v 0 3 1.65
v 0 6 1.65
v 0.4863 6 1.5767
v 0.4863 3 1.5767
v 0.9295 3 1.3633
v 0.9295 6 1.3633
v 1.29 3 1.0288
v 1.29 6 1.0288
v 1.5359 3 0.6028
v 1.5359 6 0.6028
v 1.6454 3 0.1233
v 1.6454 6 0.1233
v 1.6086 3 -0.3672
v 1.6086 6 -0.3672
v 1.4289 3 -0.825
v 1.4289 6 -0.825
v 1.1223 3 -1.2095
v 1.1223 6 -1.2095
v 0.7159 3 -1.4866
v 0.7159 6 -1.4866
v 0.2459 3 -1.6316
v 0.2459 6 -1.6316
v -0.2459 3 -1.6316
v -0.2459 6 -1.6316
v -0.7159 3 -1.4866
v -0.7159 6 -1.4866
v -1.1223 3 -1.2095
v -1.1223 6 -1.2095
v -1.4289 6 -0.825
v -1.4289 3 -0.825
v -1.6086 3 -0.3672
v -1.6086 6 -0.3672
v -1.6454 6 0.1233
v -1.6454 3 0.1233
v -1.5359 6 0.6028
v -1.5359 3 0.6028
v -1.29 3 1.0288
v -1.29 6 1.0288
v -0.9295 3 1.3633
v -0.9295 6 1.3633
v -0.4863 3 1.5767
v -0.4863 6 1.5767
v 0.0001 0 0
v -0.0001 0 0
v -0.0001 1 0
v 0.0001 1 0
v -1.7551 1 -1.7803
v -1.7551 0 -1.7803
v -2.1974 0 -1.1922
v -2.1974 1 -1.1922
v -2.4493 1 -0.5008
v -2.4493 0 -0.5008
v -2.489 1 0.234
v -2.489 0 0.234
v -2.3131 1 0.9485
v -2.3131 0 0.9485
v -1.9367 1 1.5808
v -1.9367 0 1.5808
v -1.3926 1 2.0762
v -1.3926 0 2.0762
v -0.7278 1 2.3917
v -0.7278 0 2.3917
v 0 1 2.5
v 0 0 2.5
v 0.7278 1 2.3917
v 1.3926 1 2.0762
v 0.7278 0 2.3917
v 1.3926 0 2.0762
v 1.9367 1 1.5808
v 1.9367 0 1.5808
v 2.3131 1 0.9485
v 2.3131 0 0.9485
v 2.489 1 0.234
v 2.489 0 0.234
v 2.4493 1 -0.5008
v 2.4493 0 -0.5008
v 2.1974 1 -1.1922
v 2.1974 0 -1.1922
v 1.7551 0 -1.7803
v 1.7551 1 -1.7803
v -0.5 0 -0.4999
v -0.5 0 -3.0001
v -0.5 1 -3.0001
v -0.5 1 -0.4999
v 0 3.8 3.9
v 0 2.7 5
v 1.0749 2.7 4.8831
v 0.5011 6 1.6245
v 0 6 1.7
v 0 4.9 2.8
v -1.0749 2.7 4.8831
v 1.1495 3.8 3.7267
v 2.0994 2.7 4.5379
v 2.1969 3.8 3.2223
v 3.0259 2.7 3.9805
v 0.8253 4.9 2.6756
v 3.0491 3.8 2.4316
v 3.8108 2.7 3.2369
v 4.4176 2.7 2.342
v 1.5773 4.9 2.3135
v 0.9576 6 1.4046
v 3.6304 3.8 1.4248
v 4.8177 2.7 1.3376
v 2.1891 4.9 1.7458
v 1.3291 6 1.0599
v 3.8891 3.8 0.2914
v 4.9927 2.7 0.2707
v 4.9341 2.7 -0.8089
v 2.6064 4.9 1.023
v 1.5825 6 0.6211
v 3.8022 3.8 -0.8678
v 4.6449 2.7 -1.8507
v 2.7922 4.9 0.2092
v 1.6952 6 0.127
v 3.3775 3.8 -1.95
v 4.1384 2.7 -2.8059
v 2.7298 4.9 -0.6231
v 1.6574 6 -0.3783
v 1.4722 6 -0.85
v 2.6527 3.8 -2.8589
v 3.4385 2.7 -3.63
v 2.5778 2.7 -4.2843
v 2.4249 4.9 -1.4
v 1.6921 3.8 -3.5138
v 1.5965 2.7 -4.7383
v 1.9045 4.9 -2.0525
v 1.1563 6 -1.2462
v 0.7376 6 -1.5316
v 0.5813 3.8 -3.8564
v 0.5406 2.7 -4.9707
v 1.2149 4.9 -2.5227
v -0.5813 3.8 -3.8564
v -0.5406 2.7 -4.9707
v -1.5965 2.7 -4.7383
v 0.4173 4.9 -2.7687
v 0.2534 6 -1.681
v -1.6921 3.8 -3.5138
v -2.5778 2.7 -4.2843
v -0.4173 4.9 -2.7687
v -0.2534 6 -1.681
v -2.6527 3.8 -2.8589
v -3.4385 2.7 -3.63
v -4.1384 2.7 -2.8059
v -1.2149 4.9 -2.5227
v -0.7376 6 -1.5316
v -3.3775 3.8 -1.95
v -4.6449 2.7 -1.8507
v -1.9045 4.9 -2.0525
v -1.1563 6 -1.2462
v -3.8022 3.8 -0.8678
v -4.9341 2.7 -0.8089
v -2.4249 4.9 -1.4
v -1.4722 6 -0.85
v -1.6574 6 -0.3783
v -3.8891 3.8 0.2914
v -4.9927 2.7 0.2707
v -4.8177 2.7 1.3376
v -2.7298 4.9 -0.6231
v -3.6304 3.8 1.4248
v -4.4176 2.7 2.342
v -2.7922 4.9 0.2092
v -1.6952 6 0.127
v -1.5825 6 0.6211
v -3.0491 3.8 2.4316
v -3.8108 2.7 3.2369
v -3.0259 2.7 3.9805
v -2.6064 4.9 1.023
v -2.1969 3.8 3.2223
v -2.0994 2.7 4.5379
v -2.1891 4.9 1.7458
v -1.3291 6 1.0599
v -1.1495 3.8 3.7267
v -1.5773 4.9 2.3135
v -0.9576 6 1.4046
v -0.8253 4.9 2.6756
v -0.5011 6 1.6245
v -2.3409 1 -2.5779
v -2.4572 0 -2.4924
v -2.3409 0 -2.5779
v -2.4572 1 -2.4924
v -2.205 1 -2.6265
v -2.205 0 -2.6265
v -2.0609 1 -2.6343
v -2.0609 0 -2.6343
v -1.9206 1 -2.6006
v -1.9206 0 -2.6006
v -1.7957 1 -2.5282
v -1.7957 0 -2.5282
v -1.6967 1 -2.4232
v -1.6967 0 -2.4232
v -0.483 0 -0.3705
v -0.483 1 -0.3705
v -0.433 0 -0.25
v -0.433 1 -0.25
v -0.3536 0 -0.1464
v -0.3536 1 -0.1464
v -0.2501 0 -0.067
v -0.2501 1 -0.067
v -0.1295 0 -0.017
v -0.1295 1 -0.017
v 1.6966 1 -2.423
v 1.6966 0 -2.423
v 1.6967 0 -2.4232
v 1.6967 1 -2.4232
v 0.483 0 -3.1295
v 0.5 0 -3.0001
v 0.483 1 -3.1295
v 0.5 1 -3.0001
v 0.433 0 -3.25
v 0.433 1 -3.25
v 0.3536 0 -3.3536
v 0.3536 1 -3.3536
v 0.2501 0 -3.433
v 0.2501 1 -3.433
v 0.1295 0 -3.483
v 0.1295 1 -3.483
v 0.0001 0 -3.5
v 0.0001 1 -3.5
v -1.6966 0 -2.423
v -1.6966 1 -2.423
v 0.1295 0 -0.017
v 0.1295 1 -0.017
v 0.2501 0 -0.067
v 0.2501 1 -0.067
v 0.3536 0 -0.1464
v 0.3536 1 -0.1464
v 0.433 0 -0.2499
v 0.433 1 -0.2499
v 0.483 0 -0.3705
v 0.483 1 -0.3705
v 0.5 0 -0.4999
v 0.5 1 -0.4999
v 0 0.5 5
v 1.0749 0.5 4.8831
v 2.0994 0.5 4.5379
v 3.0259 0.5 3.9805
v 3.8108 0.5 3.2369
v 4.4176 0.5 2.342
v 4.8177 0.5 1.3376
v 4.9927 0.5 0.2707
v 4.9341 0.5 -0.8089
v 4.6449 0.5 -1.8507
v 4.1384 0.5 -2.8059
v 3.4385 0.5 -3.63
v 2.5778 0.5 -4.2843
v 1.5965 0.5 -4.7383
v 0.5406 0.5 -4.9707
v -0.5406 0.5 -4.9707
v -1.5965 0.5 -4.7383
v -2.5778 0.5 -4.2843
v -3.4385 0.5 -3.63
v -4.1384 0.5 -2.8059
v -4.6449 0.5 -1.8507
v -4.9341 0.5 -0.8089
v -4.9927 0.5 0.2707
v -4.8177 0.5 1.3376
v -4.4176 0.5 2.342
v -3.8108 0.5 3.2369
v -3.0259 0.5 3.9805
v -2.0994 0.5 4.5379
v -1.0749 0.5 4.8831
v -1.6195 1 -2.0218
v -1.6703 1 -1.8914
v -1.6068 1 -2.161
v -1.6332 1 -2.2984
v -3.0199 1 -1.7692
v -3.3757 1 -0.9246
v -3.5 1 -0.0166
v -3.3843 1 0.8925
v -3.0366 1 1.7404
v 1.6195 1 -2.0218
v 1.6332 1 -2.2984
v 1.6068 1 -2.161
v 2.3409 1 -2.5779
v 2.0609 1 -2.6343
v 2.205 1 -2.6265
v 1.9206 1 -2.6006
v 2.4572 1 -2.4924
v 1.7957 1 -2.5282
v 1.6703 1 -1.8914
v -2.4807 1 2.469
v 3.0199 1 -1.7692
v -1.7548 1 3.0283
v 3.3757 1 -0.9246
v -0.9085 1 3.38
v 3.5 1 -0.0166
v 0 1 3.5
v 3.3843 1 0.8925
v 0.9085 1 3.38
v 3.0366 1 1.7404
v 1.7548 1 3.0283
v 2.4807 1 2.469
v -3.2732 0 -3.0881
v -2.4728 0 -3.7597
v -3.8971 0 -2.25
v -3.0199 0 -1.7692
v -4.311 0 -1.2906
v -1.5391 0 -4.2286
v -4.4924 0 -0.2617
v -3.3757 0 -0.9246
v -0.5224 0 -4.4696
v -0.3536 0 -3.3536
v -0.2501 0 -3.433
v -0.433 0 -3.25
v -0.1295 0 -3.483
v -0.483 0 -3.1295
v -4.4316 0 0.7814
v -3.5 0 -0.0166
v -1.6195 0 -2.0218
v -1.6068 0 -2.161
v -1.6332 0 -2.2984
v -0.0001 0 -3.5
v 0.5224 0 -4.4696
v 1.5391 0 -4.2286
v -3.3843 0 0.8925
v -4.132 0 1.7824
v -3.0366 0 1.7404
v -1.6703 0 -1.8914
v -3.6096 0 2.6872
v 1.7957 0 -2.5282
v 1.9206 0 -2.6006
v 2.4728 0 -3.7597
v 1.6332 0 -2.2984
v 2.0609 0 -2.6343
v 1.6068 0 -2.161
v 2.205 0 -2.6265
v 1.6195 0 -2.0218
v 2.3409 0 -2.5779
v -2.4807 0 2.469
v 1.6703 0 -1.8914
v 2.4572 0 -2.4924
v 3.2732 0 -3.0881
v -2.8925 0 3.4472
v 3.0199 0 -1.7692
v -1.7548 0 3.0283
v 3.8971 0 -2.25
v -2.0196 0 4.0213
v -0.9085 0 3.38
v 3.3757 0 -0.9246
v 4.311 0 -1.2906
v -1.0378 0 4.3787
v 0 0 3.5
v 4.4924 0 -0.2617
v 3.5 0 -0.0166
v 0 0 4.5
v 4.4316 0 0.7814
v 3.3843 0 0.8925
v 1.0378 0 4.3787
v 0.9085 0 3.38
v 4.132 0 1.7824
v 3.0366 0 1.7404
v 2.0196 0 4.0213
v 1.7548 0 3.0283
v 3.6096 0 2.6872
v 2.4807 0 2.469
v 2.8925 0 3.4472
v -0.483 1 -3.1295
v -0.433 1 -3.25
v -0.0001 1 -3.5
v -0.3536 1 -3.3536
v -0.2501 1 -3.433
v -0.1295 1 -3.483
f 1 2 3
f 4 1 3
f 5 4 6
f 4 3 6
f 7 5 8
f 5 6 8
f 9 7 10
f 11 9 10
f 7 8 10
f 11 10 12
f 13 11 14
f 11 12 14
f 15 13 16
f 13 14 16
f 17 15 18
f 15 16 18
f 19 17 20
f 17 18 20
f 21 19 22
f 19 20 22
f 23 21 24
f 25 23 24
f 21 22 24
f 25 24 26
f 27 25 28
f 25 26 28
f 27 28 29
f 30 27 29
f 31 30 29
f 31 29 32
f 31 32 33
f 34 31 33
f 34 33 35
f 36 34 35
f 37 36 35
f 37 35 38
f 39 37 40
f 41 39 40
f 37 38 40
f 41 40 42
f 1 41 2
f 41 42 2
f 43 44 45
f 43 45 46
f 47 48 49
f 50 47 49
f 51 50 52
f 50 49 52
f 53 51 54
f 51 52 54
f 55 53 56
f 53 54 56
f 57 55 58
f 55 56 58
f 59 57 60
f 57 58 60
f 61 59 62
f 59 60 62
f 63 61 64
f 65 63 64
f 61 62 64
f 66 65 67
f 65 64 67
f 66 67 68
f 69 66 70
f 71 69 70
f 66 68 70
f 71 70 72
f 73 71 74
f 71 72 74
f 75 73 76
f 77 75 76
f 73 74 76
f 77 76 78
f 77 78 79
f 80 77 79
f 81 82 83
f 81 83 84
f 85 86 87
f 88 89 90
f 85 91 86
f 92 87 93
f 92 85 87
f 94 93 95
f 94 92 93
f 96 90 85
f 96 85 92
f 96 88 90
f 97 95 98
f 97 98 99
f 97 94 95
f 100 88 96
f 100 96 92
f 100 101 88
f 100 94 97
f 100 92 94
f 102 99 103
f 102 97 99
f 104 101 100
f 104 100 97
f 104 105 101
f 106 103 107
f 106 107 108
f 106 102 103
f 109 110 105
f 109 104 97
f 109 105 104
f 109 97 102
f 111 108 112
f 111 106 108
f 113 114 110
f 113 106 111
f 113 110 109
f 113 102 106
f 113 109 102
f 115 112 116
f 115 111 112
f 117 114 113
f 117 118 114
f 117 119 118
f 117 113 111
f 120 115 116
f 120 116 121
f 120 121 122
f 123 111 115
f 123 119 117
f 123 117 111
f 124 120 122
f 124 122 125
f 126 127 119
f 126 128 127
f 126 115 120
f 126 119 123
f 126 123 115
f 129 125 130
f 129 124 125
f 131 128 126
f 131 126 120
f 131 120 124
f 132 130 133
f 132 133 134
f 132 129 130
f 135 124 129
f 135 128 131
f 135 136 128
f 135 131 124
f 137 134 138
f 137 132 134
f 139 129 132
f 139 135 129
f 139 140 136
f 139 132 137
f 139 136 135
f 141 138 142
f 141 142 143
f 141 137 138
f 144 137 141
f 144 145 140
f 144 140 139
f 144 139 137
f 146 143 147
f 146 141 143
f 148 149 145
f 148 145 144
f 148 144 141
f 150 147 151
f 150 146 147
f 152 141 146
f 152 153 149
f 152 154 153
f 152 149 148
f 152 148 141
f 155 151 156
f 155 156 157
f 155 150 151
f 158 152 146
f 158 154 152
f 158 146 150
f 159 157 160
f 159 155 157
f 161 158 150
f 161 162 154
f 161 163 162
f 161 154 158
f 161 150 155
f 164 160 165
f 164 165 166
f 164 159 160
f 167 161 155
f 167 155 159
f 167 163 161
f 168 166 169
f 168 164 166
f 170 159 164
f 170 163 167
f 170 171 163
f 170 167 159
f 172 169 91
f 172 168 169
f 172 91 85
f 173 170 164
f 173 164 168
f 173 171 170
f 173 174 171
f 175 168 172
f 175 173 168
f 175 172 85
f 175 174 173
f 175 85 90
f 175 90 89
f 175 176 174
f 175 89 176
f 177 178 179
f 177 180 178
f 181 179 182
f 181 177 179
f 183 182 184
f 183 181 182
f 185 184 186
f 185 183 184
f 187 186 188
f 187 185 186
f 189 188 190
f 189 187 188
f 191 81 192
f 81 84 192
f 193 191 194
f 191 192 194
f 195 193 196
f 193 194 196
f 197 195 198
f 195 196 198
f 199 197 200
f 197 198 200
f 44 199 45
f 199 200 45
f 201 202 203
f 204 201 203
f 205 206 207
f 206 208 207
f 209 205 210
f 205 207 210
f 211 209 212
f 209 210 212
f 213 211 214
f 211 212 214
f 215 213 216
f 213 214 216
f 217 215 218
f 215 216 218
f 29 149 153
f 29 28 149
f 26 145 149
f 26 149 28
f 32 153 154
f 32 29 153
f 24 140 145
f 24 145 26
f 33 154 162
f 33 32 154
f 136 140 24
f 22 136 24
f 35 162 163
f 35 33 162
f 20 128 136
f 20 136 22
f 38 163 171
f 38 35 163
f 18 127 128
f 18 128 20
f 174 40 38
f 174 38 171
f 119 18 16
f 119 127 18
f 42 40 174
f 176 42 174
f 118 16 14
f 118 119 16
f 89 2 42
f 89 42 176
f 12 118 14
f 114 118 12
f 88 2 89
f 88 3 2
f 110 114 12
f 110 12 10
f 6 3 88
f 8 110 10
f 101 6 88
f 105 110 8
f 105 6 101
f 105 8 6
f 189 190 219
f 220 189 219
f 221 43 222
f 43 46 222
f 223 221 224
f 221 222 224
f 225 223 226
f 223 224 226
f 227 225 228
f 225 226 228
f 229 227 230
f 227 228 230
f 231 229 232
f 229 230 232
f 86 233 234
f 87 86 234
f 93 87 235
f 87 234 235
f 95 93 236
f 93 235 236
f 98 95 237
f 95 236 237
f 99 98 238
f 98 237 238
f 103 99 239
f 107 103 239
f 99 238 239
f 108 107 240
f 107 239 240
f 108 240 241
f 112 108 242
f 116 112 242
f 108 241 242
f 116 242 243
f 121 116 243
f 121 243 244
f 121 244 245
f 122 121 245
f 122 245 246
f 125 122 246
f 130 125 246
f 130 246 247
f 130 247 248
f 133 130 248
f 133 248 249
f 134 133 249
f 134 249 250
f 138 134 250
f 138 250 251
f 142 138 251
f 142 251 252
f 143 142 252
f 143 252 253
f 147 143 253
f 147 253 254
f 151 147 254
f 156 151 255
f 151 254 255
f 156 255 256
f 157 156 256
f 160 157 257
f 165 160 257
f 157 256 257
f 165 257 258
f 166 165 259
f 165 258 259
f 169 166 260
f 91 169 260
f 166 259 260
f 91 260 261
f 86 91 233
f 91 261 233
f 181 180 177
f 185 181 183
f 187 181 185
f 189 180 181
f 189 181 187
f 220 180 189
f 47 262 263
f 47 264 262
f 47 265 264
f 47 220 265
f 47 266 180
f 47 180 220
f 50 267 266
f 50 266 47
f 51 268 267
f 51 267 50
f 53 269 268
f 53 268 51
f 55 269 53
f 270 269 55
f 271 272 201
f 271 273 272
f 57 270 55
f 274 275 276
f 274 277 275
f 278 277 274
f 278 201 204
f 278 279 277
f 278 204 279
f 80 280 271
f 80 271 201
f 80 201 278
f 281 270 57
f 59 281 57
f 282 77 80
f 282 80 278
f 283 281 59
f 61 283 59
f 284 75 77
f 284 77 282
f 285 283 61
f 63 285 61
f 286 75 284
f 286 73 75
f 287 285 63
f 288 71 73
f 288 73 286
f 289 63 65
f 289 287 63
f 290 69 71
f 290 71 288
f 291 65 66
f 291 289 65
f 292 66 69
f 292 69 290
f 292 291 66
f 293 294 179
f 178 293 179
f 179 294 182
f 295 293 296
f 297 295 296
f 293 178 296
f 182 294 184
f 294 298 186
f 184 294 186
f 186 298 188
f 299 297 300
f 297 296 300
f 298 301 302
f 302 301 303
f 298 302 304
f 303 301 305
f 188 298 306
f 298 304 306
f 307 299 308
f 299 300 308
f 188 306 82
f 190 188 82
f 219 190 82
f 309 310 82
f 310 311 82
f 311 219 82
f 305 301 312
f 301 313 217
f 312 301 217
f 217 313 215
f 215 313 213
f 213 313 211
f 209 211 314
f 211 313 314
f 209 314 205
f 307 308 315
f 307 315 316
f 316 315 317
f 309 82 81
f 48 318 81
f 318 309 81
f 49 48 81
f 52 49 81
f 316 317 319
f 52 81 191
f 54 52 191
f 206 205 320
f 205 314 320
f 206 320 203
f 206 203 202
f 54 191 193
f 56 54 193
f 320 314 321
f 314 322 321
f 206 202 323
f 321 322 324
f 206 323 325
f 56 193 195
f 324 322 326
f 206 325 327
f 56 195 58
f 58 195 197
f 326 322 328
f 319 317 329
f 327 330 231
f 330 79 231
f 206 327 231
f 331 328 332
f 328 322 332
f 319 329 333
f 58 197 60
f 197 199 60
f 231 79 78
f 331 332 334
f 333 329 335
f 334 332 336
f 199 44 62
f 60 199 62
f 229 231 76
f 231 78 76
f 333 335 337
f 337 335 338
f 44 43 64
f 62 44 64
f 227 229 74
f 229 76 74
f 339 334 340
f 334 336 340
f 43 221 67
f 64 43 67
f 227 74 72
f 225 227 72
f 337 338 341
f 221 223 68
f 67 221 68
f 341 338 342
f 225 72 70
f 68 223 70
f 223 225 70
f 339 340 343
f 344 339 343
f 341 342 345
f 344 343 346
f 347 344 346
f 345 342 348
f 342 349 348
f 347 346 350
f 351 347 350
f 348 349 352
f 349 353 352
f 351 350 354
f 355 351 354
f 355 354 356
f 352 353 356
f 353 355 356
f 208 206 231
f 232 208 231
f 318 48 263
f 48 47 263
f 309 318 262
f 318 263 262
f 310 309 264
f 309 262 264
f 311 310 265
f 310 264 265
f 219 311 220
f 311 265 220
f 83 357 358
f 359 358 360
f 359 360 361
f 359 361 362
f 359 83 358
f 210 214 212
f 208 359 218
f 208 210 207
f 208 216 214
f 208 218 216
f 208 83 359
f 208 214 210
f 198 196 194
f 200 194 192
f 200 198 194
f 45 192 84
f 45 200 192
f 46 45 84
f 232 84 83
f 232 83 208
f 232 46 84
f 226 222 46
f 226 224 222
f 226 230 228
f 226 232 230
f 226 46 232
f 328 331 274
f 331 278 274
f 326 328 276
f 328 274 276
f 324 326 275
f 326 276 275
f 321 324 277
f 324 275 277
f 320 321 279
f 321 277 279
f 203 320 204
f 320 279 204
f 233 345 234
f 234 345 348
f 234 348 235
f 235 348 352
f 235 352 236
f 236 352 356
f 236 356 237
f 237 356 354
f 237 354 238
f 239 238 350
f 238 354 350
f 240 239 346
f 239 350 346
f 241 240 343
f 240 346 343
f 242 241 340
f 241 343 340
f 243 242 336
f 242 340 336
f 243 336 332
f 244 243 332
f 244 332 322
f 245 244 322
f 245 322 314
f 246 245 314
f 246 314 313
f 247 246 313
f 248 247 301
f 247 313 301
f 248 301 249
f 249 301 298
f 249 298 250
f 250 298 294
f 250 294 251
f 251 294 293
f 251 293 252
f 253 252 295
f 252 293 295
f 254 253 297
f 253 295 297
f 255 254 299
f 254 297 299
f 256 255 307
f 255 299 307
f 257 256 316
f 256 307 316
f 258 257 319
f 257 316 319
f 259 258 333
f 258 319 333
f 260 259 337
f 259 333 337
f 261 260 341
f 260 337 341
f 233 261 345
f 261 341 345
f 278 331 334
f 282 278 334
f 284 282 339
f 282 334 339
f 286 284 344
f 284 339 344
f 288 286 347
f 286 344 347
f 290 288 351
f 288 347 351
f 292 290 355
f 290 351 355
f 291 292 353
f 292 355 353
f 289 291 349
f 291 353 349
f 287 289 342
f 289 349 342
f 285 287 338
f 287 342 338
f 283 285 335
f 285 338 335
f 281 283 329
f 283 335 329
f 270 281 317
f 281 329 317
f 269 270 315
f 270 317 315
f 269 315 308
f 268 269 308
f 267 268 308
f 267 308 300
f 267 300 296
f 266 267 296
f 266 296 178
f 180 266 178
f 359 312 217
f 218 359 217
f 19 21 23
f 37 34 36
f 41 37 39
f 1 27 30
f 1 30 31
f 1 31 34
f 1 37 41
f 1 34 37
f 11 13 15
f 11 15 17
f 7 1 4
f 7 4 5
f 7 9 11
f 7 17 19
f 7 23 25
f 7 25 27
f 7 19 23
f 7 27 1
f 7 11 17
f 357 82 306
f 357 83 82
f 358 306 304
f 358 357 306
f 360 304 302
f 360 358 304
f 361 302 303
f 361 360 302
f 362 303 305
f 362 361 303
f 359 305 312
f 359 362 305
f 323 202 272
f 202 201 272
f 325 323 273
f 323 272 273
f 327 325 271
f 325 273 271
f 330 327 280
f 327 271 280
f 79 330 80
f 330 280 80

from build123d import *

# Parameters (mm, degrees)
SKETCH1_R           = 5
BOSS_EXTRUDE1_DEPTH = 1
SKETCH2_R           = 5
BOSS_EXTRUDE2_DEPTH = 5
SKETCH3_R           = 1.65
CUT_EXTRUDE3_DEPTH  = 3
CHAMFER3_SIZE       = 3.3
CHAMFER4_SIZE       = 0.5
SKETCH4_W           = 1
SKETCH4_H           = 3.5
CUT_EXTRUDE4_DEPTH  = 1
FILLET1_R           = 0.5


with BuildPart() as part:
    # Sketch1 → Boss-Extrude1 (new body)
    with BuildSketch(Plane(origin=(0, 0, 0), x_dir=(1, 0, 0), z_dir=(0, 1, 0))):
        with Locations(Location((0, 0, 0), (0, 0, 270))):
            Circle(SKETCH1_R)
    extrude(amount=BOSS_EXTRUDE1_DEPTH)

    # Sketch2 → Boss-Extrude2 (add)
    with BuildSketch(Plane(origin=(0, 1, 0), x_dir=(1, 0, 0), z_dir=(0, 1, 0))):
        with Locations(Location((0, 0, 0), (0, 0, 270))):
            Circle(SKETCH2_R)
    extrude(amount=BOSS_EXTRUDE2_DEPTH)

    # Sketch3 → Cut-Extrude3 (cut)
    with BuildSketch(Plane(origin=(0, 6, 0), x_dir=(1, 0, 0), z_dir=(0, 1, 0))):
        with Locations(Location((0, 0, 0), (0, 0, 270))):
            Circle(SKETCH3_R)
    extrude(amount=-CUT_EXTRUDE3_DEPTH, mode=Mode.SUBTRACT)

    # Chamfer3
    chamfer3_edges = [part.edges().sort_by_distance(p)[0] for p in [
        (0, 6, -5),
    ]]
    chamfer(chamfer3_edges, length=CHAMFER3_SIZE)

    # Chamfer4
    chamfer4_edges = [part.edges().sort_by_distance(p)[0] for p in [
        (0, 0, -5),
    ]]
    chamfer(chamfer4_edges, length=CHAMFER4_SIZE)

    # Sketch4 → Cut-Extrude4 (cut)
    with BuildSketch(Plane.XZ):
        with BuildLine():
            Line((-2.007517527, -2.867032155), (-1.433941091, -2.047880111))
            ThreePointArc((-1.433941091, -2.047880111), (0, 2.5), (1.433941091, -2.047880111))
            Line((1.433941091, -2.047880111), (2.007517527, -2.867032155))
            ThreePointArc((2.007517527, -2.867032155), (0, 3.5), (-2.007517527, -2.867032155))
        make_face()
        with Locations((0, -1.75)):
            Rectangle(SKETCH4_W, SKETCH4_H)
    extrude(amount=-CUT_EXTRUDE4_DEPTH, mode=Mode.SUBTRACT)

    # Fillet1
    fillet1_edges = [part.edges().sort_by_distance(p)[0] for p in [
        (1.433941091, 0.5, -2.047880111),
        (2.007517527, 0.5, -2.867032155),
        (0.5, 0.5, -3.5),
        (0.5, 0.5, 0),
        (-0.5, 0.5, 0),
        (-0.5, 0.5, -3.5),
        (-1.433941091, 0.5, -2.047880111),
        (-2.007517527, 0.5, -2.867032155),
    ]]
    fillet(fillet1_edges, radius=FILLET1_R - 0.0001)  # a hair under: the kernel refuses the full size


solid = part.part
